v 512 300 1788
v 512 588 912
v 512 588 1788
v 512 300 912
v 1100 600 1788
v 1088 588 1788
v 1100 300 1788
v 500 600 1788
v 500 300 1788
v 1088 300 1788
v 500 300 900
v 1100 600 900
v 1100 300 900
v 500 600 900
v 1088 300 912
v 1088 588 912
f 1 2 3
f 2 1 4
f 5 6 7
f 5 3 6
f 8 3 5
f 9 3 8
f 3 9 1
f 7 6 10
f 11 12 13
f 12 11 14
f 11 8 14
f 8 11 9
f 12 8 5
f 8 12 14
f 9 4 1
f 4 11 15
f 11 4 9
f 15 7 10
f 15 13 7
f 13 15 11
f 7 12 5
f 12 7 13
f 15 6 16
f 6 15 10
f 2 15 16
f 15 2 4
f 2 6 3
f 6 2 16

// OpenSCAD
// file: cabinet.scad
/*

    Cabinet
    
    By Anton Augustsson


*/

module cabinet (
    thickness,
    length,
    width,
    height
    ){
/*
    ---------- Local varibles ---------- 
*/



/*
    ---------- Code ---------- 
*/


union () {

// Left
translate([
    0,
    0,
    0]) 
cube(size = [
    thickness,
    width,
    height-thickness]);

// Right
translate([
    length-thickness,
    0,
    0]) 
cube(size = [
    thickness,
    width,
    height-thickness]);
    
// Bottom 
translate([
    thickness,
    0,
    0]) 
cube(size = [
    length
    -thickness*2,
    width-thickness,
    thickness]);

// Back
translate([
    thickness,
    width-thickness,
    0]) 
cube(size = [
    length
    -thickness*2,
    thickness,
    height-thickness]);
}}



/*
    ---------- Example ---------- 
*/


thickness = 12;

length = 600;
width  = 600;
height = 900;

cabinet (
    thickness,
    length,
    width,
    height
    );
// main file
/*

    Middle Section Cabinet
    
    By Anton Augustsson


*/

use <cabinet.scad>;

module middleSectionCabinet (
    plywoodThickness,
    lengthMiddleSection,
    lengthSecondSection,
    length,
    widthCabinet,
    widthCabinetDoor,
    widthTable,
    width,
    heightTable,
    heightCabinet,
    x,y,z
    ){
/*
    ---------- Local varibles ---------- 
*/

thickness = plywoodThickness;

length = lengthMiddleSection;
width  = widthCabinet;
height = heightCabinet;


/*
    ---------- Code ---------- 
*/


translate([
	x,
	y,
	z,])

union () {

cabinet (
    thickness,
    length,
    width,
    height
    );
}}



/*
    ---------- Example ---------- 
*/


plywoodThickness = 12;

lengthMiddleSection = 600;
lengthSecondSection = lengthMiddleSection/2;
lengthTirdSection   = 200;
length=lengthMiddleSection
    +lengthSecondSection*2
    +lengthTirdSection*2;

widthCabinet     = 300;
widthCabinetDoor = widthCabinet/3;
widthTable       = 300;
width            = widthCabinet+widthTable;

heightTable   = 900;
heightCabinet = 900;


x=lengthSecondSection+lengthTirdSection;
y=width-widthCabinet;
z=heightTable;

middleSectionCabinet (
    plywoodThickness,
    lengthMiddleSection,
    lengthSecondSection,
    length,
    widthCabinet,
    widthCabinetDoor,
    widthTable,
    width,
    heightTable,
    heightCabinet,
    x,y,z
    );
